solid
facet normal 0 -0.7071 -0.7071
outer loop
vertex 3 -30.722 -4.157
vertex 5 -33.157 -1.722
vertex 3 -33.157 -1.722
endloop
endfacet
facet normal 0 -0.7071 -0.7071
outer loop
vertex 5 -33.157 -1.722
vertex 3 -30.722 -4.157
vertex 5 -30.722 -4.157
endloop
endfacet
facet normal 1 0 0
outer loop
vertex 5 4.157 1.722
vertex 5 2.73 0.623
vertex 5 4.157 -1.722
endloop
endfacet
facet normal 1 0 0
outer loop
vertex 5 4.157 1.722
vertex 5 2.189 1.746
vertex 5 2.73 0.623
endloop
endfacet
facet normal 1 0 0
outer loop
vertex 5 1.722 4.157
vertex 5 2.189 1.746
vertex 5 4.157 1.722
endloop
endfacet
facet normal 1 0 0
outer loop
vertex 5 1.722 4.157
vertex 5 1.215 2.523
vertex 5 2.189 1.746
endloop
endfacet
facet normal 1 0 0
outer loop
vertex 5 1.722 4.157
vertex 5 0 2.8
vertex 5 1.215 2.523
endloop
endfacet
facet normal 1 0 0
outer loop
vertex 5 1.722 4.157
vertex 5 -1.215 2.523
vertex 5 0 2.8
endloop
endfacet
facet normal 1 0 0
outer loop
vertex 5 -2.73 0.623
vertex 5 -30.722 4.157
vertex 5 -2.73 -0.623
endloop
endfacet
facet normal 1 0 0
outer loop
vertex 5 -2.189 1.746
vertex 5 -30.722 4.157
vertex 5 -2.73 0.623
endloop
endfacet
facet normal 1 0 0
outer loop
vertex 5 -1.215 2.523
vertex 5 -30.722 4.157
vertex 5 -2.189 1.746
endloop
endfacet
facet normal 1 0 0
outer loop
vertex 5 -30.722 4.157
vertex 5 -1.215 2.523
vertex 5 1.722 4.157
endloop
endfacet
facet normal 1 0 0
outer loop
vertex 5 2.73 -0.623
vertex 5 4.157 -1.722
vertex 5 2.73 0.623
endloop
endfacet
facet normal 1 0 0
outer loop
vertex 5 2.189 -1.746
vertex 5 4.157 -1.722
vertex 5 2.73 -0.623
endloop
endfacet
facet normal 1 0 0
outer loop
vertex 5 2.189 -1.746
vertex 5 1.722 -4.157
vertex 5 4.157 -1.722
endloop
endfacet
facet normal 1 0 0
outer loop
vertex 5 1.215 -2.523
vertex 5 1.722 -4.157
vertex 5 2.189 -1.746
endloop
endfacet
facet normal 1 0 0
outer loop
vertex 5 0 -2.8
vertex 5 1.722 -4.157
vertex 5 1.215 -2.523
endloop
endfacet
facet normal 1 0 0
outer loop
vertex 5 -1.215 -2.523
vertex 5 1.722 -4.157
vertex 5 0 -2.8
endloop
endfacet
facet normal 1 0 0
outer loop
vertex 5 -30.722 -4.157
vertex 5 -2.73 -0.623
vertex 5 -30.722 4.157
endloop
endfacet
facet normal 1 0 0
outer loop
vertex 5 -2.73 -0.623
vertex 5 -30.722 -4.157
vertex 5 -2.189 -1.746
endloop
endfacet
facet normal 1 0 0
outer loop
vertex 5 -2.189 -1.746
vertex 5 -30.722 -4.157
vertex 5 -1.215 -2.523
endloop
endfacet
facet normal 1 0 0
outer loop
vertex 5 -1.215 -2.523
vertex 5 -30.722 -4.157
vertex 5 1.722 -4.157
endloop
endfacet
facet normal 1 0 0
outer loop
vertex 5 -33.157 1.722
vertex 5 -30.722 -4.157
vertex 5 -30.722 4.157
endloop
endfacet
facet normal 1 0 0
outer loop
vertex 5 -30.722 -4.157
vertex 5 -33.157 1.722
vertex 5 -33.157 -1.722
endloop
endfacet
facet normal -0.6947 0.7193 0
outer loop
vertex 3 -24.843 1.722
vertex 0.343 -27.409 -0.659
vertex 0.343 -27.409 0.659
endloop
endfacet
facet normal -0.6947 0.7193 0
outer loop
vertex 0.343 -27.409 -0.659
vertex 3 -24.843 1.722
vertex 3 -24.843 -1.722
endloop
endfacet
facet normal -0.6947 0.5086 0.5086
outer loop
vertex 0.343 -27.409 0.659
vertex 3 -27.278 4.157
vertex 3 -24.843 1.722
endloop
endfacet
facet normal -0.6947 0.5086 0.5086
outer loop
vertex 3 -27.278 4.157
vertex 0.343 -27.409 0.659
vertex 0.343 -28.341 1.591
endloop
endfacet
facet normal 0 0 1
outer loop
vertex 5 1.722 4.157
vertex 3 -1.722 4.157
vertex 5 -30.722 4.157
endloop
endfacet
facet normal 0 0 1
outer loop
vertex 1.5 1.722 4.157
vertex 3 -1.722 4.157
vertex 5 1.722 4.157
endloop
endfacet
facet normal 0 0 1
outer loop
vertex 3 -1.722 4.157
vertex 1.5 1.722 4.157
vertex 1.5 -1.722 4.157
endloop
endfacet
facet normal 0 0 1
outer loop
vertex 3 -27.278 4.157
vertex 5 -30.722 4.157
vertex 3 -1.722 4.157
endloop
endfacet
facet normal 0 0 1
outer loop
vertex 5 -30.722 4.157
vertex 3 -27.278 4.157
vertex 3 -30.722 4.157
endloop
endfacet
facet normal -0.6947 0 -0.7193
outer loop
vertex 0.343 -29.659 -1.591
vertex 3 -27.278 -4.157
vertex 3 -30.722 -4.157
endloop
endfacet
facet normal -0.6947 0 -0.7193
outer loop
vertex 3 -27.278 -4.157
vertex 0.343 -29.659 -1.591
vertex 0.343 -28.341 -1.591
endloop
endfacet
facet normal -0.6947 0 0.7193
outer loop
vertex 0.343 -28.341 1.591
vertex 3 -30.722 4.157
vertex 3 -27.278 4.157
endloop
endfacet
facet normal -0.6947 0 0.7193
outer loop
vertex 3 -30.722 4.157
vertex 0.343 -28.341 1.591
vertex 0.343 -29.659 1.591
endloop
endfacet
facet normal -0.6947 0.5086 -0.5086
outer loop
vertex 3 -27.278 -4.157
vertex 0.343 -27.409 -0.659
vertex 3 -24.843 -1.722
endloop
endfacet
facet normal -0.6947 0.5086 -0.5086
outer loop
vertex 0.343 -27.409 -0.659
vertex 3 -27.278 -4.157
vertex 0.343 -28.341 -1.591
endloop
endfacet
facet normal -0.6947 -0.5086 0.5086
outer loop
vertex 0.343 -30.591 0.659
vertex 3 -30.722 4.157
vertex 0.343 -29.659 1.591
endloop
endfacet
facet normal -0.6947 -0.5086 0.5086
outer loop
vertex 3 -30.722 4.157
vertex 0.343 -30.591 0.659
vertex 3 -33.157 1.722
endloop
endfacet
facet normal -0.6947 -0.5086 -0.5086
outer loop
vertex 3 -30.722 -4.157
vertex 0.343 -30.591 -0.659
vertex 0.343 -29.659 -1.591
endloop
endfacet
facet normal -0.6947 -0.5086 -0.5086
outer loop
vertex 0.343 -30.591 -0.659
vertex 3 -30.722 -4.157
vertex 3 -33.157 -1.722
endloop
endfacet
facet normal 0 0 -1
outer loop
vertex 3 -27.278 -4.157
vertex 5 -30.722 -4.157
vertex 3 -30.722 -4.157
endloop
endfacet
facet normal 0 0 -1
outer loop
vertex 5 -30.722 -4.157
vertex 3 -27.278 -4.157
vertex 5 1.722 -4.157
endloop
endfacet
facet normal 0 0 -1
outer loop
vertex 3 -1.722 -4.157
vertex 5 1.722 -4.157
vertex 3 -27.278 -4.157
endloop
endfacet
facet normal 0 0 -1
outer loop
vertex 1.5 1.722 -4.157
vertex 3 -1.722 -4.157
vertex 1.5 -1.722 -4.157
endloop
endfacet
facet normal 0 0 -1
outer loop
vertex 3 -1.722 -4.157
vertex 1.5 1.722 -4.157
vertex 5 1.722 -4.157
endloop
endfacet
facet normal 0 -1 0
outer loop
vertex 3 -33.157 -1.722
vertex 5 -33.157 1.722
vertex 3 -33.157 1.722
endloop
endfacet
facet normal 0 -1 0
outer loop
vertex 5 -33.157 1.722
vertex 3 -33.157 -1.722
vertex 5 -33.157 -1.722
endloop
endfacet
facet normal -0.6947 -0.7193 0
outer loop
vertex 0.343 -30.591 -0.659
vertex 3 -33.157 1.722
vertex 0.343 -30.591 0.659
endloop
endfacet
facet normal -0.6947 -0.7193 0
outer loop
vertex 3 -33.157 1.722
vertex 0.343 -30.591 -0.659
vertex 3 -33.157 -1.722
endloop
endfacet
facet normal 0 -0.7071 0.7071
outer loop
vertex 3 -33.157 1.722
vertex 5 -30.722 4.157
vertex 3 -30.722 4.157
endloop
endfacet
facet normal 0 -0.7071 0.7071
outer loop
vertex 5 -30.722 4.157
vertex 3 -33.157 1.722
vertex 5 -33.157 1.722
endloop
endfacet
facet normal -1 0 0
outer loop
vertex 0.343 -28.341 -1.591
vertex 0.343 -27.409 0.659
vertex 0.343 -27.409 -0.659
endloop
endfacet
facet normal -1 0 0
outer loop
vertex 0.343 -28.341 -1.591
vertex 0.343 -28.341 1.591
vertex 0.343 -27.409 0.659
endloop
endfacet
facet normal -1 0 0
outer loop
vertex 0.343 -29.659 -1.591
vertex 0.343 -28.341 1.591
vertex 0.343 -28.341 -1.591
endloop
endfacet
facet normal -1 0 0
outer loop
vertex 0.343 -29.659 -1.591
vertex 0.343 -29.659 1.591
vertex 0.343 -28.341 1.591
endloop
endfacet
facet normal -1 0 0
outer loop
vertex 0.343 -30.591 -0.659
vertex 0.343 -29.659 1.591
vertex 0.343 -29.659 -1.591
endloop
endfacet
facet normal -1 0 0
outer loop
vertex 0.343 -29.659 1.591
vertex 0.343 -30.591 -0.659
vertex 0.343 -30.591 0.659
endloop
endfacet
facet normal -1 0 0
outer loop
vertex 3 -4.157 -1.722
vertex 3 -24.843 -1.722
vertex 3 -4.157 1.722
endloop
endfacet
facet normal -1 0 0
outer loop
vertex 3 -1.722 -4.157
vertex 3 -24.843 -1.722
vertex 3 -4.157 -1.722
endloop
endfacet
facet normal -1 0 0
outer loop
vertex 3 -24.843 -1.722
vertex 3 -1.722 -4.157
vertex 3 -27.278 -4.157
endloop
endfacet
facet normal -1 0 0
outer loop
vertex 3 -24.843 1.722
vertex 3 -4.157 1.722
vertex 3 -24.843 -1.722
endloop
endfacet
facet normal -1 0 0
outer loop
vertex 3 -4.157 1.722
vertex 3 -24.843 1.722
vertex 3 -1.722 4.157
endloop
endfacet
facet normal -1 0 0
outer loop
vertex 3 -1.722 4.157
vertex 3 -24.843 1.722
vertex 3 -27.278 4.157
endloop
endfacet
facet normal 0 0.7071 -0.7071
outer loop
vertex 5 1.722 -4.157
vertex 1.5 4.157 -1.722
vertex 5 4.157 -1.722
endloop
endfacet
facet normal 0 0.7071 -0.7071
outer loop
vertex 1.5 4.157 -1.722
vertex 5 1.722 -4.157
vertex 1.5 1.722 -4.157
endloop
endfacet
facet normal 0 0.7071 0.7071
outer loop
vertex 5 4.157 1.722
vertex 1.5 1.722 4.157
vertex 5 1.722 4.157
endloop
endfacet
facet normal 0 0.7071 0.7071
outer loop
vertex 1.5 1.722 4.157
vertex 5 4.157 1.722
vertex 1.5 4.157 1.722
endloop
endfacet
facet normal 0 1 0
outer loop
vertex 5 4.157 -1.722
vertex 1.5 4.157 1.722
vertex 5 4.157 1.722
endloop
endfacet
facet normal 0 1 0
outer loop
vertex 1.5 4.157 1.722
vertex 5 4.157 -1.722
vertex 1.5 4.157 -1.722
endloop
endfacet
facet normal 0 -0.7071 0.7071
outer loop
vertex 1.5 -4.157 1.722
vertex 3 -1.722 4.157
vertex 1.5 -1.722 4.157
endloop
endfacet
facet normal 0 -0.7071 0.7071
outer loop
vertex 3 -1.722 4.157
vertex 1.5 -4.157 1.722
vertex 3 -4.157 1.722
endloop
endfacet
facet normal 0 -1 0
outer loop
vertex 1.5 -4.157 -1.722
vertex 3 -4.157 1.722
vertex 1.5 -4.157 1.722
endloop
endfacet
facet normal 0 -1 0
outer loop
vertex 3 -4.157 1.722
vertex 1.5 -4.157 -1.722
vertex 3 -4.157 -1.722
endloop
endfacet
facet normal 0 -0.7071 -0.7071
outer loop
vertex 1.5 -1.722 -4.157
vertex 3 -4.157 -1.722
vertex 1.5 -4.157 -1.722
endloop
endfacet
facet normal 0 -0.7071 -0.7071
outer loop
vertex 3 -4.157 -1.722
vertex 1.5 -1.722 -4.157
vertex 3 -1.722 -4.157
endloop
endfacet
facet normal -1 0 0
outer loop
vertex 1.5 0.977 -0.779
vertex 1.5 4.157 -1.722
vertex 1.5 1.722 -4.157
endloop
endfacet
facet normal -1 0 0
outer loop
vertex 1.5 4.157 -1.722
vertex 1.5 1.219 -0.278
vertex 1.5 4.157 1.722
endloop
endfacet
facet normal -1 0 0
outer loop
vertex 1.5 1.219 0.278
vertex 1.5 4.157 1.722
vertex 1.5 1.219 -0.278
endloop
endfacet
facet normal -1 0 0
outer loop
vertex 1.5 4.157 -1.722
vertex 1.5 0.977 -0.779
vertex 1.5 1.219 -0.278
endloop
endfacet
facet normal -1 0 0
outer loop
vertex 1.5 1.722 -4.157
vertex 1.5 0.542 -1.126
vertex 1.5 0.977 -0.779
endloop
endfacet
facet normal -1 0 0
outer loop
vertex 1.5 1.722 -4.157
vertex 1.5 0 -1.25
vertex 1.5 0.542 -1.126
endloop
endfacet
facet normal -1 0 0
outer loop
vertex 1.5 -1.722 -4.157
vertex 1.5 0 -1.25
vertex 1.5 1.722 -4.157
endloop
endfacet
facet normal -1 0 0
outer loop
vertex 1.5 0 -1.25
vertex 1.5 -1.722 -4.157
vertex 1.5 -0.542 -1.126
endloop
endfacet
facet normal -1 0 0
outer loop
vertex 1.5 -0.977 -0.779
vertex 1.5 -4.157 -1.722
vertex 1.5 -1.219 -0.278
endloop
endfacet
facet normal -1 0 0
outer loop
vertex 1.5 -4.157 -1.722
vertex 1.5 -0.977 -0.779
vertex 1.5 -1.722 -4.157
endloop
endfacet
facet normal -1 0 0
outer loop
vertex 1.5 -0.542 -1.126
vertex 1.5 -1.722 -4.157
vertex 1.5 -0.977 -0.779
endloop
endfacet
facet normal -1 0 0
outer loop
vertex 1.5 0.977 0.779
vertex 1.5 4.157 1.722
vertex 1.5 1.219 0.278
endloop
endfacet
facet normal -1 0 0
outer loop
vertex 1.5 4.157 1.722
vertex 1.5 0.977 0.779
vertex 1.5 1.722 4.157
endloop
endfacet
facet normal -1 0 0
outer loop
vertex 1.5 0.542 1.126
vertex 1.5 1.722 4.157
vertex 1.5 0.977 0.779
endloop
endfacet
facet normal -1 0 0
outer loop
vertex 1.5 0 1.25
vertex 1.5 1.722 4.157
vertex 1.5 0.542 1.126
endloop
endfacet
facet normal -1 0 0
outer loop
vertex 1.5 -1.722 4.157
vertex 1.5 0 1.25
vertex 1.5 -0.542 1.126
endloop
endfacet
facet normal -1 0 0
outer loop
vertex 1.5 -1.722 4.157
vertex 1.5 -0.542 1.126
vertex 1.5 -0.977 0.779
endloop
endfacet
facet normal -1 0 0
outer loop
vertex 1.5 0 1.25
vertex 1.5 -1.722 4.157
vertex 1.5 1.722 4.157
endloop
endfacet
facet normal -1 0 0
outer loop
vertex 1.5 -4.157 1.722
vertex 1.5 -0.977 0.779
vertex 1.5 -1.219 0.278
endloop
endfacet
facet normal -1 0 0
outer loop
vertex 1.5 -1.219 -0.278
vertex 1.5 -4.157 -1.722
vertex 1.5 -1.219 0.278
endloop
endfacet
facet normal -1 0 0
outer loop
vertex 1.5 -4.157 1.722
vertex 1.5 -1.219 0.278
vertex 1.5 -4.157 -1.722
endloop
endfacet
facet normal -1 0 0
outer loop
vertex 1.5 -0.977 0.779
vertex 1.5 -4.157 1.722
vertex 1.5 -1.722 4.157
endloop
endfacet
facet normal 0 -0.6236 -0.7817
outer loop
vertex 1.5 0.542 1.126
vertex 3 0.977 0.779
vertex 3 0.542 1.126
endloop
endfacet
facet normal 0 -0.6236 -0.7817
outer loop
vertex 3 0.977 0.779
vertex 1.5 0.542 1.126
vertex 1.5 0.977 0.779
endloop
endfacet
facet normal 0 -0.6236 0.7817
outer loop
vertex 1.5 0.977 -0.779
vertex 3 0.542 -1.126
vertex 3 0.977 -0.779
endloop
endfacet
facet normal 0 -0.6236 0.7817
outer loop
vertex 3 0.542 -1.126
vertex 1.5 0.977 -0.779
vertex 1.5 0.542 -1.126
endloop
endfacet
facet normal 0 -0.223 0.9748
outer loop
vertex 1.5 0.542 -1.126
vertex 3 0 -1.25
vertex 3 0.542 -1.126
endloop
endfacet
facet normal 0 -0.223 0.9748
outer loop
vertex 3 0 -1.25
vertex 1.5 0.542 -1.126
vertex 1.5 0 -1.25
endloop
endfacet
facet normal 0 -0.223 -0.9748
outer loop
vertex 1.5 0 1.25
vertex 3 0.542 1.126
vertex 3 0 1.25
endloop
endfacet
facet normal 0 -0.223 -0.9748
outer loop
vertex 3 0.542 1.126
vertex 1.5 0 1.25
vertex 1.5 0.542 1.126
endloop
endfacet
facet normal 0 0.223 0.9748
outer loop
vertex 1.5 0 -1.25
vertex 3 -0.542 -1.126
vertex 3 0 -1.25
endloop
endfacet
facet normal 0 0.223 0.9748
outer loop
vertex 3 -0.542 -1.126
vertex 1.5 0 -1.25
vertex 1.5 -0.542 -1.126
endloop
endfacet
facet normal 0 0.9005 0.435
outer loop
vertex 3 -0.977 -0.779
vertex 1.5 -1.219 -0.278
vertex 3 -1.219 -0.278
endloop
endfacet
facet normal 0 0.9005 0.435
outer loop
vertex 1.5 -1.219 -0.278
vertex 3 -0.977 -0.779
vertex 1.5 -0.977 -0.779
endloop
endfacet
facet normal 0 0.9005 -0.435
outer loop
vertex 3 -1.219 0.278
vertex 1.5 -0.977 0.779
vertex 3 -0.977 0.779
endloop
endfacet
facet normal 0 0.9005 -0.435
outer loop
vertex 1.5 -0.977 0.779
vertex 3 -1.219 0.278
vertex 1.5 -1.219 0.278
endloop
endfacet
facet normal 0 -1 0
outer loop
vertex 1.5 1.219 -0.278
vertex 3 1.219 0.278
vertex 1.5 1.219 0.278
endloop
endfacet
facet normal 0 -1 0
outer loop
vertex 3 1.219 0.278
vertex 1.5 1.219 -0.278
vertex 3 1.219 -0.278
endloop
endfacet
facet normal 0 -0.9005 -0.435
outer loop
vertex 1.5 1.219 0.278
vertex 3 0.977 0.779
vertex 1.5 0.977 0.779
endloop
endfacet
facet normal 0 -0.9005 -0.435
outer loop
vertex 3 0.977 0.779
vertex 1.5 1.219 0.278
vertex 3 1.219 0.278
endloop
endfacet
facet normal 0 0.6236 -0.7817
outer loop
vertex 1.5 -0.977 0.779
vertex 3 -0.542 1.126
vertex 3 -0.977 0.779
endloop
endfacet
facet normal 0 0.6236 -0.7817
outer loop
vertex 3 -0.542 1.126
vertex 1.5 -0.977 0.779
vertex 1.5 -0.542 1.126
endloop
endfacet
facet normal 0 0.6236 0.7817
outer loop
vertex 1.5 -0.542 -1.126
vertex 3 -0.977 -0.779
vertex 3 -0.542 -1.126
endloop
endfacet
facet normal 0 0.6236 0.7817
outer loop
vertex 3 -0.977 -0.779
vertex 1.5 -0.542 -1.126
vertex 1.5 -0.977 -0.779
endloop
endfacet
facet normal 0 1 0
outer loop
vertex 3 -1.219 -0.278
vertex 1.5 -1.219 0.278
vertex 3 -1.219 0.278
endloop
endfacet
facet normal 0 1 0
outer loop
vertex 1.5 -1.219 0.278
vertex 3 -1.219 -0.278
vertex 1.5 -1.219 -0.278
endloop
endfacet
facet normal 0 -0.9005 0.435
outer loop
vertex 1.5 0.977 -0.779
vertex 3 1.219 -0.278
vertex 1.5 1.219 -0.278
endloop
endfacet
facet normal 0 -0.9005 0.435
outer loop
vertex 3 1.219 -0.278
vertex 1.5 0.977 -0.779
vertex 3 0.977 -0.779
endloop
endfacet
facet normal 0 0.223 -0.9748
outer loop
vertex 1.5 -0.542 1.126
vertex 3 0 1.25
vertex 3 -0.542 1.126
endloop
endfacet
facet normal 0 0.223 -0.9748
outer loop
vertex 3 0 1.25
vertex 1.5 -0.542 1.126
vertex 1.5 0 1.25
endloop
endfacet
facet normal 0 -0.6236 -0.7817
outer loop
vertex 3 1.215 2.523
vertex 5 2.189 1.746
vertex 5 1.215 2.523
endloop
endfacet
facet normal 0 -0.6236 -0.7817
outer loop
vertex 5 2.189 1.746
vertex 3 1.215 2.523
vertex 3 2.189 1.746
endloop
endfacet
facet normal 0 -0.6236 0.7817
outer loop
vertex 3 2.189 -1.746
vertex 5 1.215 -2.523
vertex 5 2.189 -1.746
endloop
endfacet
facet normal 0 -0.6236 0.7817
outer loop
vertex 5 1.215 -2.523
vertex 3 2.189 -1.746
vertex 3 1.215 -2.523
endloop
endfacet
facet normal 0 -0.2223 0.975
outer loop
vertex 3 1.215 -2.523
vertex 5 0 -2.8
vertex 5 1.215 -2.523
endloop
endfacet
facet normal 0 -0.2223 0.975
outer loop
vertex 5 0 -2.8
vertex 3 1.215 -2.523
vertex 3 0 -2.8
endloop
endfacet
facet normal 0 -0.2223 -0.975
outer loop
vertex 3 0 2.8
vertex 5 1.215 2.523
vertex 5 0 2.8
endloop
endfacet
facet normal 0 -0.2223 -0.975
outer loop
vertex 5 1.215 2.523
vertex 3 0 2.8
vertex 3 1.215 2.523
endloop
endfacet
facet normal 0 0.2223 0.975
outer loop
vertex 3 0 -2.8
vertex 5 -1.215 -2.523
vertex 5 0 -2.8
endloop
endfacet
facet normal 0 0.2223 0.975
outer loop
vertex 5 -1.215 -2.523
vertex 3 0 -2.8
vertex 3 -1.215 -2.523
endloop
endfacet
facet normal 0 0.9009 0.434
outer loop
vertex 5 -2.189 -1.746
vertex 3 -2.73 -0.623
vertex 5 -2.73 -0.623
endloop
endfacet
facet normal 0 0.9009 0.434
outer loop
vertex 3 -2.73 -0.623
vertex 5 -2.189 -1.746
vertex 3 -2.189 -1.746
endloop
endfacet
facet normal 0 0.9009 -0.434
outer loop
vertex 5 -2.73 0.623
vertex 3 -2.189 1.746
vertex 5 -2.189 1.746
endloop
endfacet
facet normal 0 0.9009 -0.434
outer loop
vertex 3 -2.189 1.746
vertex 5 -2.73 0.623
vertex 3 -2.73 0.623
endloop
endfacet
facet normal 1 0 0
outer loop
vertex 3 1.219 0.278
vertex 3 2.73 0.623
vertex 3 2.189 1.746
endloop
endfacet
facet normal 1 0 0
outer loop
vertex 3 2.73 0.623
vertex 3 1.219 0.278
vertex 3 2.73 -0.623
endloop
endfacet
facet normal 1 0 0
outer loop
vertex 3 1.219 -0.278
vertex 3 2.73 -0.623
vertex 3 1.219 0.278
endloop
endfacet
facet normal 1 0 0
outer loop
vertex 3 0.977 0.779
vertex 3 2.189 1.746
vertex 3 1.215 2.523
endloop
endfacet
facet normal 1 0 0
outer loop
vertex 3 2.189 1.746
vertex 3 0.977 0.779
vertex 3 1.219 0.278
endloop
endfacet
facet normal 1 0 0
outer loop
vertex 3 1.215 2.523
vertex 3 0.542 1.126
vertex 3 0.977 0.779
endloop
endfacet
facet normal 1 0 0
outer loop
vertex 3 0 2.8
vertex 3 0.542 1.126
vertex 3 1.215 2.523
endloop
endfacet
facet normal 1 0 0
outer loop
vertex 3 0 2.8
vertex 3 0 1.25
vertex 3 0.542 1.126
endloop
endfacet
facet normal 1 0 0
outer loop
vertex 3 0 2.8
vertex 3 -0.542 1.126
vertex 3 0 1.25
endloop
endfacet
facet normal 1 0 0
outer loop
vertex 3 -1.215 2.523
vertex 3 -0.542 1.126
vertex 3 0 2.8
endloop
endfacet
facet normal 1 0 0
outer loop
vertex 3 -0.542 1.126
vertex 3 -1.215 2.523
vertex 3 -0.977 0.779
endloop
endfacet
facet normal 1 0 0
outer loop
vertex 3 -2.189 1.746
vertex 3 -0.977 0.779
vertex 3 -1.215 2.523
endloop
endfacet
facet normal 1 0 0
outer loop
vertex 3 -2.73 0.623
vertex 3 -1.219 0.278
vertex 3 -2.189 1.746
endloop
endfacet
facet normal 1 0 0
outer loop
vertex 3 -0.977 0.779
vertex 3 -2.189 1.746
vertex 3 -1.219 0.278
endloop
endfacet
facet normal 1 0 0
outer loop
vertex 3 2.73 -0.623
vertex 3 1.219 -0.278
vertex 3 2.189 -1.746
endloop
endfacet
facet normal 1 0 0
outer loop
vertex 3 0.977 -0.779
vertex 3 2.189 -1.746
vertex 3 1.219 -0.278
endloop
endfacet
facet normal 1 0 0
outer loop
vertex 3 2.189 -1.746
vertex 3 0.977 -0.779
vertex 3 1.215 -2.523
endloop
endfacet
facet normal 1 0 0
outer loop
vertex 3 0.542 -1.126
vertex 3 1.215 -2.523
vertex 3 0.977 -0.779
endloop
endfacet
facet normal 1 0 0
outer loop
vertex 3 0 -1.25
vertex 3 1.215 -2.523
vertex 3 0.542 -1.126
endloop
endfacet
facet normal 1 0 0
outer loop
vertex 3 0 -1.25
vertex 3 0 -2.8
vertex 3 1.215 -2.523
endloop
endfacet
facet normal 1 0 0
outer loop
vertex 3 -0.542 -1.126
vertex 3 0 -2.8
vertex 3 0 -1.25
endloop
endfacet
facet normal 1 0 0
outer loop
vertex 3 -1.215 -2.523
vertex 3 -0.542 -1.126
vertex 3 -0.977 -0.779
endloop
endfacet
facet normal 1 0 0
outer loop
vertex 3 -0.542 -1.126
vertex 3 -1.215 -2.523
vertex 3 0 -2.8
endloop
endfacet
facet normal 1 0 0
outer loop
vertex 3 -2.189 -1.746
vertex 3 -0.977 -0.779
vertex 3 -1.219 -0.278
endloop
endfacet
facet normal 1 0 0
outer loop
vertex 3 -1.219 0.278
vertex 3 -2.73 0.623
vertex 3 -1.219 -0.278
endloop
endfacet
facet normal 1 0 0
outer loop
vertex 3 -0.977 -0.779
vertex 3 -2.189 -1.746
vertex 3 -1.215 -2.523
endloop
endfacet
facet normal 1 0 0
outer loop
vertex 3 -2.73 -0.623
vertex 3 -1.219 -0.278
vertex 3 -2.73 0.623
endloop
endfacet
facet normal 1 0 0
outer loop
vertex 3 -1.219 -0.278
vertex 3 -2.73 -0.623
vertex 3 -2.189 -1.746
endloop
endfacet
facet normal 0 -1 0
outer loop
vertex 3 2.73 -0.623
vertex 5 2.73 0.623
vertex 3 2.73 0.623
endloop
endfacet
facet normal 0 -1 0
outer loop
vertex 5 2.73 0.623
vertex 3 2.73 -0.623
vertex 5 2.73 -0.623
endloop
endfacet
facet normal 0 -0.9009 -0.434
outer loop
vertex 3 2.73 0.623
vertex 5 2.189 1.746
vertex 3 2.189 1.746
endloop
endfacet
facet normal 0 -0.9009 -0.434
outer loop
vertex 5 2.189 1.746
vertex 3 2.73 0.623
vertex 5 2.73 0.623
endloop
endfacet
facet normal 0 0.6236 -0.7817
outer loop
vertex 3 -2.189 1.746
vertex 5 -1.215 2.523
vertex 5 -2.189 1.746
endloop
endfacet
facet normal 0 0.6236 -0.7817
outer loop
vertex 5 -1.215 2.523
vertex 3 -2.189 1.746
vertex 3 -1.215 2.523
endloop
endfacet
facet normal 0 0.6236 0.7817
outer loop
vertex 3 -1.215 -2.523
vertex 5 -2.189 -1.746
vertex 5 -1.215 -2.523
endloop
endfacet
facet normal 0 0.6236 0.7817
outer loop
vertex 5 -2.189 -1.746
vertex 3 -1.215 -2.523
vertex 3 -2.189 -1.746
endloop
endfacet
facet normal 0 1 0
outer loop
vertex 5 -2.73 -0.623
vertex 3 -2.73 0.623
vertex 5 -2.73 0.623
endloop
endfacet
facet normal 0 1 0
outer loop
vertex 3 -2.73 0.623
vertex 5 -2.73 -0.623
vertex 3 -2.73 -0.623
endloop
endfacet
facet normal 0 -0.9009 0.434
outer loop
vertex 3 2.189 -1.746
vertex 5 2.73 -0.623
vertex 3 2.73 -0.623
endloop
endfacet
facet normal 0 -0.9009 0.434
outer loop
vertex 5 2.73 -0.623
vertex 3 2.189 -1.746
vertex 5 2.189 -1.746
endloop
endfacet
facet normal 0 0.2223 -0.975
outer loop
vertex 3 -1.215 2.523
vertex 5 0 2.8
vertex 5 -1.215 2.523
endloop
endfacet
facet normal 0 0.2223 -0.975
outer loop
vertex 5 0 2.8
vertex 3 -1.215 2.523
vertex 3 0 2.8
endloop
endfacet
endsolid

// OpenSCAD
use <../openscad/libs/utilities.scad>

rotate_y(90){
    nano_converter_plate_gripper();
}

module nano_converter_plate_gripper(){

    // defining temporary module for cylinder that
    // will print better when turned sideways
    module cyl_rot(d, h, center=false){
        $fn=8;
        rotate_z(22.5){
            cylinder(d=d, h=h, center=center);
        }
    }
    // and another for a hemisphere sphere
    module semi_sph_rot(d){
        $fn=8;
        rotate_z(22.5){
            difference(){
                sphere(d=d);
                cylinder(d=2*d,h=2*d);
            }
        }
    }
    bridge_h = 3;
    bridge_t = 2;
    h_diff = 1.5;
    centre2centre_d = 29;
    cyl_d = 9;
    difference(){
        union(){
            translate_z(h_diff){
                cyl_rot(d=cyl_d, h=bridge_h-h_diff+tiny());
            }
            sequential_hull(){
                translate([0, -centre2centre_d, cyl_d/2]){
                    semi_sph_rot(d=cyl_d);
                }
                translate([0, -centre2centre_d, bridge_h]){
                    cyl_rot(d=cyl_d, h=bridge_t);
                }
                translate_z(bridge_h){
                    cyl_rot(d=cyl_d, h=bridge_t);   
                }
            }
        }

        translate_z(1.5+h_diff){
            no2_selftap_counterbore();
        }
    }
}
